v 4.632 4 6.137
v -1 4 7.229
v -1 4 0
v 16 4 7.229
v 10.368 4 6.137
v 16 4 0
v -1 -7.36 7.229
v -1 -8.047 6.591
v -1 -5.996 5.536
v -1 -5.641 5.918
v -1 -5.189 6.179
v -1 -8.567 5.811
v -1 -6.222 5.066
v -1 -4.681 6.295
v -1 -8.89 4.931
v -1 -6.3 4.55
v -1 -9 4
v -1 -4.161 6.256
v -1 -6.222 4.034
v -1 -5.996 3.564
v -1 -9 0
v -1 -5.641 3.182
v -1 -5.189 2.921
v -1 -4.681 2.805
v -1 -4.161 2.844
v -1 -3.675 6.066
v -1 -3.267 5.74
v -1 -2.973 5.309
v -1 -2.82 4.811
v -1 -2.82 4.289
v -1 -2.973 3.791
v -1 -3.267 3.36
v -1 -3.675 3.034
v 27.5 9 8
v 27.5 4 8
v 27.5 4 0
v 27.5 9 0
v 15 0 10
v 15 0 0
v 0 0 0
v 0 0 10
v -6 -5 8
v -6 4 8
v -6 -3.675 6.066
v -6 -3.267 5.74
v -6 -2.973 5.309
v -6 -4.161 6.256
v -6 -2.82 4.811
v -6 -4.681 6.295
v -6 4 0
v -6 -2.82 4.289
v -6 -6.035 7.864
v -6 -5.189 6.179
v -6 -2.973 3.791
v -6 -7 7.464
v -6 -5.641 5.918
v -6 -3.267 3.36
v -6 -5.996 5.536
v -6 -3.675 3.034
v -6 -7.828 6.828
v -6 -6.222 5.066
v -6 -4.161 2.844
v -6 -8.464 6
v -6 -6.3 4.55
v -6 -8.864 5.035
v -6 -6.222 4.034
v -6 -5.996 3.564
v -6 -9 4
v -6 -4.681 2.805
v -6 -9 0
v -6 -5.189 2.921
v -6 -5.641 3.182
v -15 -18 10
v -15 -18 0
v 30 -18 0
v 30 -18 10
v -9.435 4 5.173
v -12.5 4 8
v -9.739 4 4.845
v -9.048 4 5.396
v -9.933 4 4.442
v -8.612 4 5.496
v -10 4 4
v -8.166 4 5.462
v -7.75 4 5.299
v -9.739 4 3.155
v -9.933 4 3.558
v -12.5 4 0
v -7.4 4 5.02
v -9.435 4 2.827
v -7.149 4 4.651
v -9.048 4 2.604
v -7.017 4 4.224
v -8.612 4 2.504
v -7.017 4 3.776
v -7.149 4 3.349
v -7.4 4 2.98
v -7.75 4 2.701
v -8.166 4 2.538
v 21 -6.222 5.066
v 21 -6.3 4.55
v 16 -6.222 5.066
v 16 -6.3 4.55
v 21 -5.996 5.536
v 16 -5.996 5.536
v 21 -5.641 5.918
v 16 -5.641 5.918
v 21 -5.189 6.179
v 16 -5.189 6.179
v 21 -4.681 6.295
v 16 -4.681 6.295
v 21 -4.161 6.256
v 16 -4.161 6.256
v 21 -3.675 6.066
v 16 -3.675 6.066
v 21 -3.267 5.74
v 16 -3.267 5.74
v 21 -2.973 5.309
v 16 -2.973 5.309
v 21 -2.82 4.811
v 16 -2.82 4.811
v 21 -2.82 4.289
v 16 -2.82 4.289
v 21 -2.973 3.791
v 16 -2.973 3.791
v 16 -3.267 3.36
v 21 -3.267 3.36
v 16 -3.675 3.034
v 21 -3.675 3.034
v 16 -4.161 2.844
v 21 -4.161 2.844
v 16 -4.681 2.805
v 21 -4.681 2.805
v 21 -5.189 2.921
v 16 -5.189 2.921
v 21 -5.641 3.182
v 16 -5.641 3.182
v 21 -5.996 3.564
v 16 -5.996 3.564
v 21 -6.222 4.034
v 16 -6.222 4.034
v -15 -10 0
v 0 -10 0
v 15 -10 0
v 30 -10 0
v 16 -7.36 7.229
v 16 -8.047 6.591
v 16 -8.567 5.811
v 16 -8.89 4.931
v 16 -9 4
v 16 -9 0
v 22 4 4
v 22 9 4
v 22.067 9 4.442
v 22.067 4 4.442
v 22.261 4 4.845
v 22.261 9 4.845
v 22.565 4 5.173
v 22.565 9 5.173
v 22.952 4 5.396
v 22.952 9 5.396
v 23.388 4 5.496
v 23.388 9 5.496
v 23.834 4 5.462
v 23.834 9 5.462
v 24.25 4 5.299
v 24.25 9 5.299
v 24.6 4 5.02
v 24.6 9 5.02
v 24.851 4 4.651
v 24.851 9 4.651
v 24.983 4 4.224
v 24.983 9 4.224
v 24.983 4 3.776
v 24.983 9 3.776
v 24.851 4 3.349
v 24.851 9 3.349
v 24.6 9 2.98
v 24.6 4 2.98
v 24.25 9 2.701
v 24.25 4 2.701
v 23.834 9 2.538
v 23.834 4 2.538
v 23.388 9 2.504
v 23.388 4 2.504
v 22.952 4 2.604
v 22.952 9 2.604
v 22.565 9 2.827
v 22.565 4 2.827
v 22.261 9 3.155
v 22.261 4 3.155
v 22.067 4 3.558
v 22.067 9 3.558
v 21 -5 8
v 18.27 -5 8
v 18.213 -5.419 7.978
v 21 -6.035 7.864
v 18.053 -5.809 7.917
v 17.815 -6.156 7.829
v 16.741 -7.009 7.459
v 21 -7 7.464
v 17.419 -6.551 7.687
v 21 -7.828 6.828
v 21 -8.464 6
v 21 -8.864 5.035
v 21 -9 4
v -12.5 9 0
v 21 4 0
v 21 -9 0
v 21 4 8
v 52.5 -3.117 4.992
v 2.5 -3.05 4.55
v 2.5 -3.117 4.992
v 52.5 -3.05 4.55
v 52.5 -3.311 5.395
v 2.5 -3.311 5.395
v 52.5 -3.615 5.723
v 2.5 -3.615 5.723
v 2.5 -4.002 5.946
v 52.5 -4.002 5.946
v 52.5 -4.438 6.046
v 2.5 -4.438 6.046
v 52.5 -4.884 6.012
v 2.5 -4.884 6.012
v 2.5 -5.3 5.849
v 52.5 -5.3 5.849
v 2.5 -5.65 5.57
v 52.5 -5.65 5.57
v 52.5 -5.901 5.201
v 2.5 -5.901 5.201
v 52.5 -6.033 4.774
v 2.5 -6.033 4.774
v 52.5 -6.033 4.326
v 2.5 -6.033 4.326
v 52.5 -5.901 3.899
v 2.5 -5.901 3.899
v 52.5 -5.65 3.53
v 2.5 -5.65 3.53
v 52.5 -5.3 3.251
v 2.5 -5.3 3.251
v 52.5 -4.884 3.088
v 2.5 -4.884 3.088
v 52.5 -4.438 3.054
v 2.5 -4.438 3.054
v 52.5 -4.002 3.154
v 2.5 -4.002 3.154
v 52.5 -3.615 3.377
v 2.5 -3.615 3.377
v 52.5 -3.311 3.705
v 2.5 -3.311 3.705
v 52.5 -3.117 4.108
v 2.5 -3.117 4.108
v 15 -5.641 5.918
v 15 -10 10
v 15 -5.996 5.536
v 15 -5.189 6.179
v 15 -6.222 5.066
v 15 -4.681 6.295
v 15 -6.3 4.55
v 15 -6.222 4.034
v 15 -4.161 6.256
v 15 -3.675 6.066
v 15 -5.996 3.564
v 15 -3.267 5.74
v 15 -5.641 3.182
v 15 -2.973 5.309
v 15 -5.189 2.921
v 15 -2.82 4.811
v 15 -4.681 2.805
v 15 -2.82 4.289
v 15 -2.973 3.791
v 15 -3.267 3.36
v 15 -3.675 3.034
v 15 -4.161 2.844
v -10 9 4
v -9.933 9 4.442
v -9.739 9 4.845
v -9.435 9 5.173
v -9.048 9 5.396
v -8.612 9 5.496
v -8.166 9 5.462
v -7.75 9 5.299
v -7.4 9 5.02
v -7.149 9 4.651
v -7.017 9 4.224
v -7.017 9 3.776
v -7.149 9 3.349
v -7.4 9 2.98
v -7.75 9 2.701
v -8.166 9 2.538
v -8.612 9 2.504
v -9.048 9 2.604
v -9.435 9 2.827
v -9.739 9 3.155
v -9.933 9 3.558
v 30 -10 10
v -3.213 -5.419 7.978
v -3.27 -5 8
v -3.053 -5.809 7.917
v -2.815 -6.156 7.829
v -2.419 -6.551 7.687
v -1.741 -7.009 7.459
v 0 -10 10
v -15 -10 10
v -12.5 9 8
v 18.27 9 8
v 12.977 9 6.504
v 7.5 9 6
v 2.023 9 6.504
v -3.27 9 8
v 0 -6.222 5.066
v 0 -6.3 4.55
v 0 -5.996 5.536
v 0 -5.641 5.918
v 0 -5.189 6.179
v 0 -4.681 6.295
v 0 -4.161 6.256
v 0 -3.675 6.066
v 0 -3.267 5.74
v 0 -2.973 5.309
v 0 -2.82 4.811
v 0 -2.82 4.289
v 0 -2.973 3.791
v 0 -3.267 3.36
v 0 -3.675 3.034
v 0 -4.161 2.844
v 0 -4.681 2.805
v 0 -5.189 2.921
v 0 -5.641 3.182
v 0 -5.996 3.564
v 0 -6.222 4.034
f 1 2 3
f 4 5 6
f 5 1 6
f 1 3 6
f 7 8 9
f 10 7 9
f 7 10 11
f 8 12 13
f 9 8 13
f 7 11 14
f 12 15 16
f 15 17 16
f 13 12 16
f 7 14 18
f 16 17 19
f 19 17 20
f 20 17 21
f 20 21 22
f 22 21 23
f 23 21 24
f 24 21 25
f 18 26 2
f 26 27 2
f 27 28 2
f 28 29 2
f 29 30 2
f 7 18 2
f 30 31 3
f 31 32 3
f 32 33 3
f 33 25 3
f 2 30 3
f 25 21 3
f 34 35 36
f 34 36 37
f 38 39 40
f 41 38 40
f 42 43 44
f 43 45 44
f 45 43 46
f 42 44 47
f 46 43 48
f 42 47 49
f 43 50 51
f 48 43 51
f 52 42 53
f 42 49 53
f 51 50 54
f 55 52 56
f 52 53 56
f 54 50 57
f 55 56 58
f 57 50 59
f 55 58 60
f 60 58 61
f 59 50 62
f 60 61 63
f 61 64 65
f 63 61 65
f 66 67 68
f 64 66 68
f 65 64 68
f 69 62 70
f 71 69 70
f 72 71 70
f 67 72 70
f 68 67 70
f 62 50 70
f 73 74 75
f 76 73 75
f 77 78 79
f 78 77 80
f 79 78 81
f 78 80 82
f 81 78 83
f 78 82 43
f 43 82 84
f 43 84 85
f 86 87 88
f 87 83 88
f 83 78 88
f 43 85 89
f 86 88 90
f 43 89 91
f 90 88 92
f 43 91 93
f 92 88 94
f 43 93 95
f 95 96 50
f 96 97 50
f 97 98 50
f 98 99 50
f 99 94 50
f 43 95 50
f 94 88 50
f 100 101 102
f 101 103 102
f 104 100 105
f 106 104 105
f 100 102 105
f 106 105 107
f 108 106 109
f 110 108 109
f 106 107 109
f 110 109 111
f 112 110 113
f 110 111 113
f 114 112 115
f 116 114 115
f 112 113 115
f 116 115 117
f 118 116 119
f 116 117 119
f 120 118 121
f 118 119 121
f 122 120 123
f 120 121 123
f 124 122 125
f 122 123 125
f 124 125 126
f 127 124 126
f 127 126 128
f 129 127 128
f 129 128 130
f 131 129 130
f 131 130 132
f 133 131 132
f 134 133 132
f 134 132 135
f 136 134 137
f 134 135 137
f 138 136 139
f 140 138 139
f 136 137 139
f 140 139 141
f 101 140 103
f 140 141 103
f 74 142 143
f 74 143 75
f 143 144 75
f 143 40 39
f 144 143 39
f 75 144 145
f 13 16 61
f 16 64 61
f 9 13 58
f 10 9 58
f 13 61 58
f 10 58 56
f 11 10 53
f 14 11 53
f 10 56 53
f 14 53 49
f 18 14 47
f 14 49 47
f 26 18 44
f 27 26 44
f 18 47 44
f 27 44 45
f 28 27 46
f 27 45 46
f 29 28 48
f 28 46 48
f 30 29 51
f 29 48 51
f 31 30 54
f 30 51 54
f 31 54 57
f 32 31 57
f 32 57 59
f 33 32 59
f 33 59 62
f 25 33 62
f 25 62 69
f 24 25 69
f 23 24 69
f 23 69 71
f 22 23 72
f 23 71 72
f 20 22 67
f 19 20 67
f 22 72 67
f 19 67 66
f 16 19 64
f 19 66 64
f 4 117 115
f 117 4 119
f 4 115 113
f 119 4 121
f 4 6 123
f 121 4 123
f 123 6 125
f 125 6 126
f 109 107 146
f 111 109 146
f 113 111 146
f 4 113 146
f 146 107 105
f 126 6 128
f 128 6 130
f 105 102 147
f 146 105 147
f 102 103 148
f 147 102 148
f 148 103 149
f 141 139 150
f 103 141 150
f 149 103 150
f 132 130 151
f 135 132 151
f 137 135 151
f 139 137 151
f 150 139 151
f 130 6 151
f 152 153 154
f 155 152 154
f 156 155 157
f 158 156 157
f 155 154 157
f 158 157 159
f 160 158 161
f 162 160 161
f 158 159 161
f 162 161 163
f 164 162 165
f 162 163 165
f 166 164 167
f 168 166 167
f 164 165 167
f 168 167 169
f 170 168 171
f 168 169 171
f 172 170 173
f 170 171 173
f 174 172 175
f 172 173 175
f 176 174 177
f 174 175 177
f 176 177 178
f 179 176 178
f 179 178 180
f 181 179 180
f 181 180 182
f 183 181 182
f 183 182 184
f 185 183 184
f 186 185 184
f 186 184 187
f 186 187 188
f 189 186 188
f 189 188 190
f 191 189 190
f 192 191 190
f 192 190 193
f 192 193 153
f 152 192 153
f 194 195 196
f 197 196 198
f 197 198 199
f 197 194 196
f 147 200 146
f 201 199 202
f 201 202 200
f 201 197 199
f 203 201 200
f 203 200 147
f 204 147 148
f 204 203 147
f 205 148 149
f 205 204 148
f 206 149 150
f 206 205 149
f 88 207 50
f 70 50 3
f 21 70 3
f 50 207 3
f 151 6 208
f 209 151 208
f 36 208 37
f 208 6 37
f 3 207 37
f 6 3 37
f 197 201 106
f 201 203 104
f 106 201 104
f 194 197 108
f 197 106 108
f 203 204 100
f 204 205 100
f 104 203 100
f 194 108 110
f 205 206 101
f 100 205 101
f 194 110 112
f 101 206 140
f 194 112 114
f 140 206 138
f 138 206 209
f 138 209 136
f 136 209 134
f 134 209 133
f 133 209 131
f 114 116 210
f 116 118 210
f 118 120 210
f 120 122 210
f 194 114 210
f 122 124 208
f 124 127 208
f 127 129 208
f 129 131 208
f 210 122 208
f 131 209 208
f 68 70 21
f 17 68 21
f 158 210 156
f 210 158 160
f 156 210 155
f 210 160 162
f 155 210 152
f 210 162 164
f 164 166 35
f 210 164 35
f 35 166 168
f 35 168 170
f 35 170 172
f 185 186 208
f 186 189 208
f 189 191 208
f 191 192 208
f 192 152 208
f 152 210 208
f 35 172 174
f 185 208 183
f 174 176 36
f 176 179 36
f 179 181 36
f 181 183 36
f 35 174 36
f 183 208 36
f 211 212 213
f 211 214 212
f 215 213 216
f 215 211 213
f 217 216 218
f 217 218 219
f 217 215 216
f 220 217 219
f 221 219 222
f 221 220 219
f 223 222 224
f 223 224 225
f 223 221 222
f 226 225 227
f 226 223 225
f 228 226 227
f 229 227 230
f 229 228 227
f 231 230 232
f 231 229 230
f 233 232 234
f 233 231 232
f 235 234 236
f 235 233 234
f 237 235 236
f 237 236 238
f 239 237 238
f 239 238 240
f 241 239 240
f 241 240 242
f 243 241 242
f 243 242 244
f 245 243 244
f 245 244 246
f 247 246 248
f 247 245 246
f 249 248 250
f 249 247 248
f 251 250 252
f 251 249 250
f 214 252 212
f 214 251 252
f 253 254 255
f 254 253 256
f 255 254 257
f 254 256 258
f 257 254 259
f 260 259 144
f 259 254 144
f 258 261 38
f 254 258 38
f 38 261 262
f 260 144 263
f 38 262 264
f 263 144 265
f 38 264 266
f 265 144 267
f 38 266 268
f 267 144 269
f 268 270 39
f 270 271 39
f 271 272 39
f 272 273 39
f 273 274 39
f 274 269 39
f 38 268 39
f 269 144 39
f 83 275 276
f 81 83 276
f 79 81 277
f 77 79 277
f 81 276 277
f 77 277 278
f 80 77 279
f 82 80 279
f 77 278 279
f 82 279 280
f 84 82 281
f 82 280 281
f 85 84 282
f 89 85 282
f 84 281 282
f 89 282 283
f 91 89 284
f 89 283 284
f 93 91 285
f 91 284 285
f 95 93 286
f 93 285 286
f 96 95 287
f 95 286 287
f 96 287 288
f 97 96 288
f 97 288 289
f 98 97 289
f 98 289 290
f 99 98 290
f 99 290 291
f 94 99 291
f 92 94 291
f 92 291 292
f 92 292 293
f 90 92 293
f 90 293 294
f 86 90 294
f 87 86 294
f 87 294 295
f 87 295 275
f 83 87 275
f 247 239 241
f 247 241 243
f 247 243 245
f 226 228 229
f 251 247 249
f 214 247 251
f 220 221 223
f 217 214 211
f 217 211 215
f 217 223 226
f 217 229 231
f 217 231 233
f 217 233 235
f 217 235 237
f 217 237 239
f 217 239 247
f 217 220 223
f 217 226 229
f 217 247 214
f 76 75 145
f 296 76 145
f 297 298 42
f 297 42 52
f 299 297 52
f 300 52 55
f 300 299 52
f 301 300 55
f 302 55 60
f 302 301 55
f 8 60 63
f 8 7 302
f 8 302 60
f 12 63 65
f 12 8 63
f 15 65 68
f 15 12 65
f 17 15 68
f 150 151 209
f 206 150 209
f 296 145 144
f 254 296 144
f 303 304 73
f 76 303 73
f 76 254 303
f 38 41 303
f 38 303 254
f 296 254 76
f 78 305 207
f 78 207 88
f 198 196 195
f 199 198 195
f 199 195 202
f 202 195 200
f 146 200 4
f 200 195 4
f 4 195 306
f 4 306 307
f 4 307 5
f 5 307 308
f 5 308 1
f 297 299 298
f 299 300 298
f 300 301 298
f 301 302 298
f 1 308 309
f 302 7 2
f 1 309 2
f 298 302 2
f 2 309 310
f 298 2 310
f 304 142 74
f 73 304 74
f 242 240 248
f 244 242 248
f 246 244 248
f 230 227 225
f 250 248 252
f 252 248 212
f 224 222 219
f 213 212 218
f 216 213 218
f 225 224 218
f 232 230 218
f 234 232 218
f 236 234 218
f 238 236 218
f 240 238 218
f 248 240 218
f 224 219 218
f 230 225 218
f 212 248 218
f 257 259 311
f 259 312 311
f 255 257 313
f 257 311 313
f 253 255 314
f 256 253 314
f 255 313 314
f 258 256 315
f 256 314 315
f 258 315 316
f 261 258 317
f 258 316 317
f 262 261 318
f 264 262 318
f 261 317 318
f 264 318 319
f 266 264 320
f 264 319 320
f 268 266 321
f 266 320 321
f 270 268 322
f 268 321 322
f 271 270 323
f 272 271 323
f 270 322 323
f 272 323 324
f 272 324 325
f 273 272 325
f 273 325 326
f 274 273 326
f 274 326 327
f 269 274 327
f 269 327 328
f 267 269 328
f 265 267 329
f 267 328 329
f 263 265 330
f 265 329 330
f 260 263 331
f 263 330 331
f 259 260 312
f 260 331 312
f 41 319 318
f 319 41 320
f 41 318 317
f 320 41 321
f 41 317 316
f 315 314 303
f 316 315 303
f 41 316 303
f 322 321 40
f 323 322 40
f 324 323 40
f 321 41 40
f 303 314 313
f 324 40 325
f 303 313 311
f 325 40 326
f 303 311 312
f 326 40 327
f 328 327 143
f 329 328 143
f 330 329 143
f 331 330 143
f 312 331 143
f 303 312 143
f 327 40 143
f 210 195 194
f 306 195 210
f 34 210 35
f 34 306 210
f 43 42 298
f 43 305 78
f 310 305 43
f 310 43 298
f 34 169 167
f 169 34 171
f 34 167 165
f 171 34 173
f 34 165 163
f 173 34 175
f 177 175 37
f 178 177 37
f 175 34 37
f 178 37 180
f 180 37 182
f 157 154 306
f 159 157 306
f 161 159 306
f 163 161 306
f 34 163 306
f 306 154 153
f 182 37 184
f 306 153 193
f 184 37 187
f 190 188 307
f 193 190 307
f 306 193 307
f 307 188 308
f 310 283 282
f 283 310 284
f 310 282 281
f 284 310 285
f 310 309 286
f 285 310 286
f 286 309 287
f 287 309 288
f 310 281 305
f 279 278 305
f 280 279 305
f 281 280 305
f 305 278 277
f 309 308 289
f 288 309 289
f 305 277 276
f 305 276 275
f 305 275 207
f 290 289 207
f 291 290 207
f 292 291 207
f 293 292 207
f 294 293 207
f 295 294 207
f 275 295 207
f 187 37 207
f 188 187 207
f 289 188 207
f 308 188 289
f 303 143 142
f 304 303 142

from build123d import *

# Parameters (mm, degrees)
F1_DEPTH  = 10
F2_DEPTH  = 8
F3_R      = 1.75
F4_DEPTH  = 50
F5_R      = 1.5
F6_DEPTH  = 25
F7_DEPTH  = 1
F8_R      = 4
F9_R      = 1.5
F10_DEPTH = 16.3613527737


with BuildPart() as f1:
    # F0 (on Top) → F1 (new body)
    with BuildSketch(Plane.XY):
        Polygon((15, 0), (0, 0), (0, -10), (-15, -10), (-15, -18), (30, -18), (30, -10), (15, -10), align=None)
    extrude(amount=F1_DEPTH)


with BuildPart() as f2:
    # F0 (on Top) → F2 (new body)
    with BuildSketch(Plane.XY):
        Polygon((-6, 4), (-6, -9), (-1, -9), (-1, 4), (16, 4), (16, -9), (21, -9), (21, 4), (23.5, 4), (27.5, 4), (27.5, 9), (-12.5, 9), (-12.5, 4), (-8.5, 4), align=None)
        with BuildLine():
            ThreePointArc((-7, 5.5), (-7.4393398282, 4.4393398282), (-8.5, 4))
            ThreePointArc((-8.5, 4), (-9.5606601718, 6.5606601718), (-7, 5.5))
        make_face(mode=Mode.SUBTRACT)
        with BuildLine():
            ThreePointArc((25, 5.5), (24.5606601718, 4.4393398282), (23.5, 4))
            ThreePointArc((23.5, 4), (22.4393398282, 6.5606601718), (25, 5.5))
        make_face(mode=Mode.SUBTRACT)
        with BuildLine():
            ThreePointArc((-7, 5.5), (-9.5606601718, 6.5606601718), (-8.5, 4))
            ThreePointArc((-8.5, 4), (-7.4393398282, 4.4393398282), (-7, 5.5))
        make_face()
        with BuildLine():
            ThreePointArc((25, 5.5), (22.4393398282, 6.5606601718), (23.5, 4))
            ThreePointArc((23.5, 4), (24.5606601718, 4.4393398282), (25, 5.5))
        make_face()
    extrude(amount=F2_DEPTH)


with BuildPart() as f4_tool:
    # F3 (on face) → F4 (new body, symmetric)
    with BuildSketch(Plane(origin=(0, 0, 0), x_dir=(0, -1, 0), z_dir=(-1, 0, 0))):
        with Locations((4.55, 4.55)):
            Circle(F3_R)
    extrude(amount=F4_DEPTH, both=True)


with BuildPart() as f1_1:
    add(f1.part)

    # F4: cut by f4_tool
    add(f4_tool.part, mode=Mode.SUBTRACT)

    # F0 (on Top) → F7 (cut)
    with BuildSketch(Plane.XY):
        Polygon((-12.5, 4), (-12.5, -9), (-6, -9), (-6, 4), (-8.5, 4), align=None)
    extrude(amount=F7_DEPTH, mode=Mode.SUBTRACT)


with BuildPart() as f2_1:
    add(f2.part)

    # F4: cut by f4_tool
    add(f4_tool.part, mode=Mode.SUBTRACT)

    # F8
    f8_edges = [f2_1.edges().sort_by_distance(p)[0] for p in [
        (18.5, -9, 8),
        (-3.5, -9, 8),
    ]]
    fillet(f8_edges, radius=F8_R)

    # F9 (on face) → F10 (cut, through all)
    with BuildSketch(Plane(origin=(0, 9, 0), x_dir=(-1, 0, 0), z_dir=(0, 1, 0))):
        with Locations((8.5, 4)):
            Circle(F9_R)
        with Locations((-23.5, 4)):
            Circle(F9_R)
        with BuildLine():
            Line((3.2703296143, 8), (-18.2703296143, 8))
            ThreePointArc((-18.2703296143, 8), (-7.5, 6), (3.2703296143, 8))
        make_face()
    extrude(amount=-F10_DEPTH, mode=Mode.SUBTRACT)


with BuildPart() as f6:
    # F5 (on face) → F6 (new body, symmetric)
    with BuildSketch(Plane.YZ.offset(27.5)):
        with Locations((-4.55, 4.55)):
            Circle(F5_R)
    extrude(amount=F6_DEPTH, both=True)


solid = Compound([f1_1.part, f2_1.part, f6.part])
